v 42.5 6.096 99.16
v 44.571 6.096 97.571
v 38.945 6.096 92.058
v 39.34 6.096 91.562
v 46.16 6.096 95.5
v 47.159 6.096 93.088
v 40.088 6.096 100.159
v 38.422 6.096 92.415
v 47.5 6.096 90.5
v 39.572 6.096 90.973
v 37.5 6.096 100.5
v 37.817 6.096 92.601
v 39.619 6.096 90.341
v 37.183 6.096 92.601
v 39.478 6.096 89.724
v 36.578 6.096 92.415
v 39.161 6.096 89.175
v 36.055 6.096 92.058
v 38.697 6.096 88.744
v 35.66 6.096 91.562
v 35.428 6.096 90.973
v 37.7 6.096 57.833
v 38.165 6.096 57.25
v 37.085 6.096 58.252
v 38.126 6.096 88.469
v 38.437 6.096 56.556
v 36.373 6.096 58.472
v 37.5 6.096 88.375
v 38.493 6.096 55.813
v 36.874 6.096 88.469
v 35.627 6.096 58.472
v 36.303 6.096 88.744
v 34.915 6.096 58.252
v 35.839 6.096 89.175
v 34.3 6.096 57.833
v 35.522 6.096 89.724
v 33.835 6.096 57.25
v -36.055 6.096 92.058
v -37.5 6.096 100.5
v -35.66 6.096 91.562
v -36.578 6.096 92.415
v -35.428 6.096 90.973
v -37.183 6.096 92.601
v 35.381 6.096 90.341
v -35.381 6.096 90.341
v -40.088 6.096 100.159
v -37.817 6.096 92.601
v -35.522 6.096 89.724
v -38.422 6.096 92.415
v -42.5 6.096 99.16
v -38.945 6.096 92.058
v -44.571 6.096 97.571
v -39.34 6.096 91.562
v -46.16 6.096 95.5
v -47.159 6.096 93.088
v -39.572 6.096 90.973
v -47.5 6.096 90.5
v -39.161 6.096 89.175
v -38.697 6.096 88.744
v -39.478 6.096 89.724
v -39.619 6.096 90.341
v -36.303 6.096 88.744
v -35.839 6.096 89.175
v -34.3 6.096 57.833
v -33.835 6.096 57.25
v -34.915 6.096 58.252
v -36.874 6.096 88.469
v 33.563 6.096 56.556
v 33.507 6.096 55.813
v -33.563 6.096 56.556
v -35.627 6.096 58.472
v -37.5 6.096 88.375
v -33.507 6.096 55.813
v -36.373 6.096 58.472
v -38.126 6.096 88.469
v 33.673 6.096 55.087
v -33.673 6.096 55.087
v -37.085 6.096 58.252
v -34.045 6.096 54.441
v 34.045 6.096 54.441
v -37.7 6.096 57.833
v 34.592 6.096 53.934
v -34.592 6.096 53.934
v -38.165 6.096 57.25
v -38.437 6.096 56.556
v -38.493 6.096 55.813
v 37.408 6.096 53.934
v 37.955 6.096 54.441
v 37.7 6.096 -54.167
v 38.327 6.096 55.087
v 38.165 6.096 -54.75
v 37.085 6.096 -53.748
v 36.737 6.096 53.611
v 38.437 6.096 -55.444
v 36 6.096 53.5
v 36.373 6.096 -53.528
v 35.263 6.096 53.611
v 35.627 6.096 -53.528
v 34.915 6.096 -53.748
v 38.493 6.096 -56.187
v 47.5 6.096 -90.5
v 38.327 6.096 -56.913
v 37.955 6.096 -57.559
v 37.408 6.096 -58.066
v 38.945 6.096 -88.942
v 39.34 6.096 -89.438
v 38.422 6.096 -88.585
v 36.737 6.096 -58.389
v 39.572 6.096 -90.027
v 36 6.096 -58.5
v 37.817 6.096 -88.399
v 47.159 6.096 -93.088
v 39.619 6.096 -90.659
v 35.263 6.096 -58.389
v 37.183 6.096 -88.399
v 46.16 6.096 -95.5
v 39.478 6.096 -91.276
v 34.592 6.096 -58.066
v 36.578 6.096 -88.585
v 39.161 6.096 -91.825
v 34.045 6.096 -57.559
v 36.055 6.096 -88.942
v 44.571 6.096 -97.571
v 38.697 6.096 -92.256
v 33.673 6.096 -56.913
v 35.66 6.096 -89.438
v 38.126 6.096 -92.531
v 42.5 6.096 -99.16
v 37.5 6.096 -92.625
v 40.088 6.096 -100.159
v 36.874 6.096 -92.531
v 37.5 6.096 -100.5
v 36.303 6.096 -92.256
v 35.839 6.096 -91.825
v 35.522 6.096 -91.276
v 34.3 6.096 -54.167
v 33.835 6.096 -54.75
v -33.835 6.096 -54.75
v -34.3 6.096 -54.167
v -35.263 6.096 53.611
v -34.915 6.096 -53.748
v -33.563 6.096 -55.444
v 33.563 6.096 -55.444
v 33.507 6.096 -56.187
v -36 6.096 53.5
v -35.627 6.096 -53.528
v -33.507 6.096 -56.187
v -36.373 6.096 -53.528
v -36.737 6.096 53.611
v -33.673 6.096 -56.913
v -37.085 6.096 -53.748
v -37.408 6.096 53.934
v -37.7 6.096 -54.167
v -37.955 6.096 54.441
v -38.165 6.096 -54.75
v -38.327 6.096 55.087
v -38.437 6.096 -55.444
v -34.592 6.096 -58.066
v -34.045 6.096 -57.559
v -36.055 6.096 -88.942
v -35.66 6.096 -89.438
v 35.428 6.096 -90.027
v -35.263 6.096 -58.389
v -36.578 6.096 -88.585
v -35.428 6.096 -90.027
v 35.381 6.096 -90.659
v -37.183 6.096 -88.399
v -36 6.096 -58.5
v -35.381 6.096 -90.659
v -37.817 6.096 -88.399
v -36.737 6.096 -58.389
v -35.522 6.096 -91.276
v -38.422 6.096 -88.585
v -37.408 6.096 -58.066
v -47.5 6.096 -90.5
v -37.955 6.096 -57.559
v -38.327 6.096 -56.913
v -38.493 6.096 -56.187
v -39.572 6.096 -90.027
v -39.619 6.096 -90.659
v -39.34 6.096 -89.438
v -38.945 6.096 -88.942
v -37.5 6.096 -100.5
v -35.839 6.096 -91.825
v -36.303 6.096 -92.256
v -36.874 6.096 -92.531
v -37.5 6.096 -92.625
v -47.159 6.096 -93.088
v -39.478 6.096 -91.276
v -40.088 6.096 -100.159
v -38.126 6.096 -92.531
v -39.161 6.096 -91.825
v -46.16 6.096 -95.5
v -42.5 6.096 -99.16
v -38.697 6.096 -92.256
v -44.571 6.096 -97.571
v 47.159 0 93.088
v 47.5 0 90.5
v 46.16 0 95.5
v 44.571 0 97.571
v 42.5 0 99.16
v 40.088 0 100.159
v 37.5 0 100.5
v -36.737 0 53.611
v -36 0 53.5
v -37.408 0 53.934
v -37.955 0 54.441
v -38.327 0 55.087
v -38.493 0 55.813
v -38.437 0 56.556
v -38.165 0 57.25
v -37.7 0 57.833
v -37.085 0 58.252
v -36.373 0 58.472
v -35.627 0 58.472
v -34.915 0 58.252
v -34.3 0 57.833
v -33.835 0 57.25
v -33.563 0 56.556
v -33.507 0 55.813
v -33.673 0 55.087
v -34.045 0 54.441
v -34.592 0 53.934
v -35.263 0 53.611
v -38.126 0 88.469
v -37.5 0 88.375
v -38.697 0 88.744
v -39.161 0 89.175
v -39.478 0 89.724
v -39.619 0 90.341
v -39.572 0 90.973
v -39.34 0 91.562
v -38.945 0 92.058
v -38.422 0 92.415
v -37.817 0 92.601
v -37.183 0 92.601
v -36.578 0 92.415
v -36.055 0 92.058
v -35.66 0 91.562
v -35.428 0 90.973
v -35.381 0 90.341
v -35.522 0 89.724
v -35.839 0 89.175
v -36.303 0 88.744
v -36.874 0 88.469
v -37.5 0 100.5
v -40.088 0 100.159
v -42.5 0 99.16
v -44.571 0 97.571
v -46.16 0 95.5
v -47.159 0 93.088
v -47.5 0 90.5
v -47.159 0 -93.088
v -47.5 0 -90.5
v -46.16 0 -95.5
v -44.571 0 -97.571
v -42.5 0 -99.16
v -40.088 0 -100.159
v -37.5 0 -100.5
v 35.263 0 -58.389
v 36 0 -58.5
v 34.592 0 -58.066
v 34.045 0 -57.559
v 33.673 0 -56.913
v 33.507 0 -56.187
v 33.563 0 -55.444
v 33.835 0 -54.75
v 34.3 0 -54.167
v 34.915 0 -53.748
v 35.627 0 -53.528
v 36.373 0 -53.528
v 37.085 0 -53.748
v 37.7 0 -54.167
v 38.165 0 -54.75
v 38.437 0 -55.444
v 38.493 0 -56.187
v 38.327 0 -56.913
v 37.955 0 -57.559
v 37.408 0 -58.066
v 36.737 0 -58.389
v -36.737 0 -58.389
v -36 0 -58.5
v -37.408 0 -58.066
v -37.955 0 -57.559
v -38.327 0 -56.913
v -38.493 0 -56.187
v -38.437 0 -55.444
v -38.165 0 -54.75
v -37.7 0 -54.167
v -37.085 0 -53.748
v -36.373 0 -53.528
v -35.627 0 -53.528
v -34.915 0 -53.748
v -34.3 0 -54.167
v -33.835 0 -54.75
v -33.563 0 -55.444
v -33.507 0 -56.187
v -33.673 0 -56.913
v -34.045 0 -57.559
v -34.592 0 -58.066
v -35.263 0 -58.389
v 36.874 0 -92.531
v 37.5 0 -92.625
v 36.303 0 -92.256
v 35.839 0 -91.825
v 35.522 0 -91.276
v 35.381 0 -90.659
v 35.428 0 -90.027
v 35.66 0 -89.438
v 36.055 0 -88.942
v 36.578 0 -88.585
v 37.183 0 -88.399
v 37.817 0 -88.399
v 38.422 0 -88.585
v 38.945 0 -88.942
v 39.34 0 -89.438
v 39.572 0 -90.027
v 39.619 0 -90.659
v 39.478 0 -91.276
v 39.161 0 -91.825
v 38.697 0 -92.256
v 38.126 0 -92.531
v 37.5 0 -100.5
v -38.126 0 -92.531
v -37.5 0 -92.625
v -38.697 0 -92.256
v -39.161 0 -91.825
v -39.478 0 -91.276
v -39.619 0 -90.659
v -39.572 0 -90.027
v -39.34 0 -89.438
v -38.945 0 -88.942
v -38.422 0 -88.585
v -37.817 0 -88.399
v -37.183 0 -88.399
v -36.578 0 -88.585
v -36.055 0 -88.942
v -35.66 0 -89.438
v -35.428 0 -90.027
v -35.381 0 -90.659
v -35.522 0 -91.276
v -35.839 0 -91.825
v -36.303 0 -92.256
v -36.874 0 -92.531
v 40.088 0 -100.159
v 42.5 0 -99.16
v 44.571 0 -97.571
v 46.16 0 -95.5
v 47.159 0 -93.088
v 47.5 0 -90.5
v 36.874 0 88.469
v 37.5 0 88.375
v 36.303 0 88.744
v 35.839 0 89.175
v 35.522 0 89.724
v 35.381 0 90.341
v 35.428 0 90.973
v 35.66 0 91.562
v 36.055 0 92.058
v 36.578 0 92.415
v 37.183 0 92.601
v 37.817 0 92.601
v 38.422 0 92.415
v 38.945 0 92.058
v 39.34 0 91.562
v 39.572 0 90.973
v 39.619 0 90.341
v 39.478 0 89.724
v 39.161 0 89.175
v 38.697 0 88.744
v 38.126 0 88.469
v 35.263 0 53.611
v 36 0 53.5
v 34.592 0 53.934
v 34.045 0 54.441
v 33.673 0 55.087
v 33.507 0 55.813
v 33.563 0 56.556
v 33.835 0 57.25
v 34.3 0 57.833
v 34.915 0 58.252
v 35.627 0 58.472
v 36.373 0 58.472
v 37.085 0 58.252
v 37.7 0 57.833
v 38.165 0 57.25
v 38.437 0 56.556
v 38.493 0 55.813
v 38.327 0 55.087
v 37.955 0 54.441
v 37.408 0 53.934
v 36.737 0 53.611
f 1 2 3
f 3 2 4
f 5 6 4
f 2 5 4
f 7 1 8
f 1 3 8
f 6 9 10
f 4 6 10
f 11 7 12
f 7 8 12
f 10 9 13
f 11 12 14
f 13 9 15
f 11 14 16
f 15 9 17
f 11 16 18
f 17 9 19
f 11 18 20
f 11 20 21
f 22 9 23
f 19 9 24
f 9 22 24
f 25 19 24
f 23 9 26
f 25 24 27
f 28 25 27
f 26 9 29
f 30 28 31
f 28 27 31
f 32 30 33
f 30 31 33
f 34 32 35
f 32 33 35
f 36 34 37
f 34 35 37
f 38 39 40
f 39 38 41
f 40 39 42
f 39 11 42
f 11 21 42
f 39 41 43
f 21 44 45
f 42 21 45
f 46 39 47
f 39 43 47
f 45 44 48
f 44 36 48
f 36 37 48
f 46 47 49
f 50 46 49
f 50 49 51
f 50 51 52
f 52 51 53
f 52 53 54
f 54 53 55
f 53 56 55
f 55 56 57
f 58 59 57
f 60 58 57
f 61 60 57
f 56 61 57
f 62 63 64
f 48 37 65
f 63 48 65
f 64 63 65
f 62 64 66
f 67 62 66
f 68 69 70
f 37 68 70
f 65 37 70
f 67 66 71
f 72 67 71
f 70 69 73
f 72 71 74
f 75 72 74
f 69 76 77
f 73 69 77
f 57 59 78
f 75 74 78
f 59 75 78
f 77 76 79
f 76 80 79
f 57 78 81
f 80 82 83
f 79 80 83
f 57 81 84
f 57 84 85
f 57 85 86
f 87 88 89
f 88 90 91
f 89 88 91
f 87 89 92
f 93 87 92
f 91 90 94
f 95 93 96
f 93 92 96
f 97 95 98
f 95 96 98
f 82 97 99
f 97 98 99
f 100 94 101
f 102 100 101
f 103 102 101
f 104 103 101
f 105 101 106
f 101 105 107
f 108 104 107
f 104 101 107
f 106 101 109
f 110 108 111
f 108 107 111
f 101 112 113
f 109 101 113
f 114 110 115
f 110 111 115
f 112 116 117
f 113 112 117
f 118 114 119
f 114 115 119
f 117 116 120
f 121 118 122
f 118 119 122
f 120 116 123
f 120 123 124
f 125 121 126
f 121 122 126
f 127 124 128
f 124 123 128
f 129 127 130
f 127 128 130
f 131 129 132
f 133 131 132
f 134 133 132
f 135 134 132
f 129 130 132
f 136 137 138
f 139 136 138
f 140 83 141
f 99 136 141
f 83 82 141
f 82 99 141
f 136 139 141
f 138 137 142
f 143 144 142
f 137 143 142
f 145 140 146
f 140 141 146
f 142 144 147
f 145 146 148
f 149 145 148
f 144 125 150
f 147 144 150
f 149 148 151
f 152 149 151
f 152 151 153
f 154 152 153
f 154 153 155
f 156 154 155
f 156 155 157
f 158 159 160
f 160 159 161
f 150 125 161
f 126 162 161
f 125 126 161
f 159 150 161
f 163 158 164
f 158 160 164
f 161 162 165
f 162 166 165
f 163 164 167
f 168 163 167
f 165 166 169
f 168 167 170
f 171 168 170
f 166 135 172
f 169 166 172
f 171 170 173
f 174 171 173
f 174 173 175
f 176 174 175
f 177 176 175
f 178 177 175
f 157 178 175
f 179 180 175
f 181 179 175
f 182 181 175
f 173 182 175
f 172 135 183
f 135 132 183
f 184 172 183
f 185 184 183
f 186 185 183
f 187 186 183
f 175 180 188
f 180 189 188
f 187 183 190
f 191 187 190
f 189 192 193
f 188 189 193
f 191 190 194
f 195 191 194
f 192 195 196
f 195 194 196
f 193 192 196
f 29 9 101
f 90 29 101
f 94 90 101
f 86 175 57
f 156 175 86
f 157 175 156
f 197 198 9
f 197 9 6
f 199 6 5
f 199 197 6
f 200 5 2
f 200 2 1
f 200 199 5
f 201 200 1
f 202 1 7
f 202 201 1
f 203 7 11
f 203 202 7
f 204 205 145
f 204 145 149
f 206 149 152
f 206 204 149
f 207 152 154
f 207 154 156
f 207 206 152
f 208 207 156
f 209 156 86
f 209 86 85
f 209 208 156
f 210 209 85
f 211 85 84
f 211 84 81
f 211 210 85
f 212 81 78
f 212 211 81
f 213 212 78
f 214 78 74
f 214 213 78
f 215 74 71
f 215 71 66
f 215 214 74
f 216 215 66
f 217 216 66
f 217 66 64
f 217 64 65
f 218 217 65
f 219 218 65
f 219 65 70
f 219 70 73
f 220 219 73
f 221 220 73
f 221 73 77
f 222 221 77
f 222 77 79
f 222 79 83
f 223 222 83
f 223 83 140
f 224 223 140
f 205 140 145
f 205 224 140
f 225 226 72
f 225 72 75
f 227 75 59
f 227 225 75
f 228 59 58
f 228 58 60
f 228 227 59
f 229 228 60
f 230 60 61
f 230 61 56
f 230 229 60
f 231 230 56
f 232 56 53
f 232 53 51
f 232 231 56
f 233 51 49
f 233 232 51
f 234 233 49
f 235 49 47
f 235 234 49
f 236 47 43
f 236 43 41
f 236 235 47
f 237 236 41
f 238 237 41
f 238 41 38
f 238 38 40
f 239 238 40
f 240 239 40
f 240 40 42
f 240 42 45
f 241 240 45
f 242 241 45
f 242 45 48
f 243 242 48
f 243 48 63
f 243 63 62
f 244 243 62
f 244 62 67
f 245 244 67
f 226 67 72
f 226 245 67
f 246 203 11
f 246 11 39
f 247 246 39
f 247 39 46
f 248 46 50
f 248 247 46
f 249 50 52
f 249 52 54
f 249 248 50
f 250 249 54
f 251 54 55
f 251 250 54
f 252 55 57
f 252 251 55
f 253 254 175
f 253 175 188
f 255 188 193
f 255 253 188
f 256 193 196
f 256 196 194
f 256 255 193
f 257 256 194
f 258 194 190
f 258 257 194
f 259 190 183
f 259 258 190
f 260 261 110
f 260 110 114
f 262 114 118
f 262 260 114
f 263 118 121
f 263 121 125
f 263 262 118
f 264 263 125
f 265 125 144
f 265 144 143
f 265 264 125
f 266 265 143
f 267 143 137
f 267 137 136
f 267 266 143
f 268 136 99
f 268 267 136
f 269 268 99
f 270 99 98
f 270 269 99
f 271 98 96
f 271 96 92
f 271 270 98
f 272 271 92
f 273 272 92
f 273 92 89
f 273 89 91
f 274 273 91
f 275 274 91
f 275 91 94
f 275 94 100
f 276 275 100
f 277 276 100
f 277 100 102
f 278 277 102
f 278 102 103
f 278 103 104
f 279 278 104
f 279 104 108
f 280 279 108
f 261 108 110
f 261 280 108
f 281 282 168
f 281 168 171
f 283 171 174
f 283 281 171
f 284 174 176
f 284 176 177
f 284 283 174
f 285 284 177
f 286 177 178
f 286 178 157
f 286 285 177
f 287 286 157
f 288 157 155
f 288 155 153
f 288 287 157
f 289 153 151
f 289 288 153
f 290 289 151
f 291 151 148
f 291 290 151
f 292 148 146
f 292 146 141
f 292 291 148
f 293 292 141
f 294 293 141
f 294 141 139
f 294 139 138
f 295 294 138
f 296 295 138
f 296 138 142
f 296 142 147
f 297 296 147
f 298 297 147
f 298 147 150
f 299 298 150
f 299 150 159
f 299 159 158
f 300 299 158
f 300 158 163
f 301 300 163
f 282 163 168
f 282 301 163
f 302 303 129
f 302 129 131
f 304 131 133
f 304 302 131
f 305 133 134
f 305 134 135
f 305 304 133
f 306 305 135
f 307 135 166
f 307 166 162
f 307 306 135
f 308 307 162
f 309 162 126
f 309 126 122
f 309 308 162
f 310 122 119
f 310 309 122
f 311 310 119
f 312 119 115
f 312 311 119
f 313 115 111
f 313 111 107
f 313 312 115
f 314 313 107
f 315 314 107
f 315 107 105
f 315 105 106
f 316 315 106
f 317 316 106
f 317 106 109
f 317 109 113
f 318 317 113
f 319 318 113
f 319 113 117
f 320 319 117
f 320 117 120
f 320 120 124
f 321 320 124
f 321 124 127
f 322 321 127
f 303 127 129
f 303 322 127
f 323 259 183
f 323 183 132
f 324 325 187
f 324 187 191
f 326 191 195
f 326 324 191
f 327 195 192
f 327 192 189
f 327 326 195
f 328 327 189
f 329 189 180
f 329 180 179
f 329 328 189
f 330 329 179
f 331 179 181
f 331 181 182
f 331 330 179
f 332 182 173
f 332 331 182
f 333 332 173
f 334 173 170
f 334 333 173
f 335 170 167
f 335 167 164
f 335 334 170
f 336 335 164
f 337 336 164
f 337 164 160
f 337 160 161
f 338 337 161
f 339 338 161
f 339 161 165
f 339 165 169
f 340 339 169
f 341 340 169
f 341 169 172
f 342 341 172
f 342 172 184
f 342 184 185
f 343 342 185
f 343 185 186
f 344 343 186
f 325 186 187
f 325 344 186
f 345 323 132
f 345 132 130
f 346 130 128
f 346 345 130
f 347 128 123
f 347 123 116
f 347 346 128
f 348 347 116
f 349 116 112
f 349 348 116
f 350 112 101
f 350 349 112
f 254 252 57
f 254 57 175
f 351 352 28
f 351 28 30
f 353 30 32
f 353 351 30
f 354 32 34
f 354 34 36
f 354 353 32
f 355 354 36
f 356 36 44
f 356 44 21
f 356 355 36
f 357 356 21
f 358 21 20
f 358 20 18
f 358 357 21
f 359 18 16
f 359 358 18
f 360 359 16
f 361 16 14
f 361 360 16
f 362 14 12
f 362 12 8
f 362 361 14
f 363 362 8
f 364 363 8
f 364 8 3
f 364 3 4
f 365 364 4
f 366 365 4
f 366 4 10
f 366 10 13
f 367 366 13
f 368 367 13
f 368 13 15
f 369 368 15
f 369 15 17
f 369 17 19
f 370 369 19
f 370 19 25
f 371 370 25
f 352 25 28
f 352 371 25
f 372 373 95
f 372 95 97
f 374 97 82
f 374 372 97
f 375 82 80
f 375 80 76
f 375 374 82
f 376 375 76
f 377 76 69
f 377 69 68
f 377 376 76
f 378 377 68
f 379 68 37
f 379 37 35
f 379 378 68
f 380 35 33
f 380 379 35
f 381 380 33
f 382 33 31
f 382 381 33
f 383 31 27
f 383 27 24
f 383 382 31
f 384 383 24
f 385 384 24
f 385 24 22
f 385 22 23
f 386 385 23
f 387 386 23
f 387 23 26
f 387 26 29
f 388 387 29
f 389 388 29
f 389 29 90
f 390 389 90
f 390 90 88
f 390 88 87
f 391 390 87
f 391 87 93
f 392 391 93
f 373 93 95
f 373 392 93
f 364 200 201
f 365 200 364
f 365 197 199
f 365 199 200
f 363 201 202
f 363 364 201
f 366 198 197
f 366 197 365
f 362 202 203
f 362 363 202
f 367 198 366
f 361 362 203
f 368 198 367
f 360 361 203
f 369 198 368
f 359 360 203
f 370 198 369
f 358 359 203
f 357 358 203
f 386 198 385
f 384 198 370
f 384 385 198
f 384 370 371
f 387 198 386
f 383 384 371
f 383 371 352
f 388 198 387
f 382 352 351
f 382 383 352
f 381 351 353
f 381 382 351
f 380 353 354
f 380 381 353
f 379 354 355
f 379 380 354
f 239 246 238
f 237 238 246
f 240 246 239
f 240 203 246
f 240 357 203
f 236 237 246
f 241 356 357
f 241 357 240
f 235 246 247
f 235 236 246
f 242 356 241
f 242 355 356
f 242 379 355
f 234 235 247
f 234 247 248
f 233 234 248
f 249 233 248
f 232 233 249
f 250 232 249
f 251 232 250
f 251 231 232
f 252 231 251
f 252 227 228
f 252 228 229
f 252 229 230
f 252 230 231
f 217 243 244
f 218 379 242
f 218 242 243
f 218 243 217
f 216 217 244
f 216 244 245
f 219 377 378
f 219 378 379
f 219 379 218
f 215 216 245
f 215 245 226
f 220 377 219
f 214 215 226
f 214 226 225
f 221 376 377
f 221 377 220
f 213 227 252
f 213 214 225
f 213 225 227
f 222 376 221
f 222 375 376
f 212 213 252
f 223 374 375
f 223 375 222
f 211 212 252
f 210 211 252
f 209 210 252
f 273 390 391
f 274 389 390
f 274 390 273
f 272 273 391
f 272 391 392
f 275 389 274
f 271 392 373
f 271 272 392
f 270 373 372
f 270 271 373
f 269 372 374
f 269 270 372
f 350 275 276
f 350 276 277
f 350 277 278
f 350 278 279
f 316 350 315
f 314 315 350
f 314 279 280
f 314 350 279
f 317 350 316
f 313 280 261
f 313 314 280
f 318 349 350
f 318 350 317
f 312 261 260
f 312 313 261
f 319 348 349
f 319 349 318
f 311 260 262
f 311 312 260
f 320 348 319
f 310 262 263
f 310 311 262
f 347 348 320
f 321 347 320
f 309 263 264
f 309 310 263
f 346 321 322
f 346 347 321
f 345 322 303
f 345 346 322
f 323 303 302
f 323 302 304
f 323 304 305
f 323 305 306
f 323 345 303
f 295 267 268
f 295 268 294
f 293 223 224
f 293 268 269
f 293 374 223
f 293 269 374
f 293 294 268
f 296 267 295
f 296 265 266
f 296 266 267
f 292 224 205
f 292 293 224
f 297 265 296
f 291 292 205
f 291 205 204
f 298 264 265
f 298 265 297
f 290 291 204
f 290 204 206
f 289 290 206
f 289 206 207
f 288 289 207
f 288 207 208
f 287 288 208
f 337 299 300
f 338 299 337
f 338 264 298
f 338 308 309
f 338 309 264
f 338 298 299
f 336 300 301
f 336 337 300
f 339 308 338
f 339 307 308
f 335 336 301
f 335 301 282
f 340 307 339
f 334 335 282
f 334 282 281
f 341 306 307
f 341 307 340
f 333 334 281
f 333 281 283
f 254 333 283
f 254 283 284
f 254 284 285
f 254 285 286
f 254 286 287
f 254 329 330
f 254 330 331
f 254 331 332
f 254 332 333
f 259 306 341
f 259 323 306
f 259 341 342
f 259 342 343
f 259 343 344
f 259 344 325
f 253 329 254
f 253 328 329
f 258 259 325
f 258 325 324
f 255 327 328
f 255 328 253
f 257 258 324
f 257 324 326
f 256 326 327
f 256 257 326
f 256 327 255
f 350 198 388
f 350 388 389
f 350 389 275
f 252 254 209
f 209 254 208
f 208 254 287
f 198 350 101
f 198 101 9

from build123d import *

# Parameters (mm, degrees)
SKETCH1_R           = 2.5
SKETCH1_R_2         = 2.125
BOSS_EXTRUDE1_DEPTH = 6.096


with BuildPart() as part:
    # Sketch1 → Boss-Extrude1 (new body)
    with BuildSketch(Plane(origin=(0, 0, 0), x_dir=(1, 0, 0), z_dir=(0, 1, 0))):
        with BuildLine():
            Line((-37.5, 100.5), (37.5, 100.5))
            ThreePointArc((37.5, 100.5), (44.571067812, 97.571067812), (47.5, 90.5))
            Line((47.5, 90.5), (47.5, -90.5))
            ThreePointArc((47.5, -90.5), (44.571067812, -97.571067812), (37.5, -100.5))
            Line((37.5, -100.5), (-37.5, -100.5))
            ThreePointArc((-37.5, -100.5), (-44.571067812, -97.571067812), (-47.5, -90.5))
            Line((-47.5, -90.5), (-47.5, 90.5))
            ThreePointArc((-47.5, 90.5), (-44.571067812, 97.571067812), (-37.5, 100.5))
        make_face()
        with Locations(Location((-36, 56, 0), (0, 0, 90))):
            Circle(SKETCH1_R, mode=Mode.SUBTRACT)
        with Locations(Location((36, 56, 0), (0, 0, 90))):
            Circle(SKETCH1_R, mode=Mode.SUBTRACT)
        with Locations(Location((36, -56, 0), (0, 0, 90))):
            Circle(SKETCH1_R, mode=Mode.SUBTRACT)
        with Locations(Location((-36, -56, 0), (0, 0, 90))):
            Circle(SKETCH1_R, mode=Mode.SUBTRACT)
        with Locations(Location((-37.5, 90.5, 0), (0, 0, 90))):
            Circle(SKETCH1_R_2, mode=Mode.SUBTRACT)
        with Locations(Location((37.5, 90.5, 0), (0, 0, 90))):
            Circle(SKETCH1_R_2, mode=Mode.SUBTRACT)
        with Locations(Location((37.5, -90.5, 0), (0, 0, 90))):
            Circle(SKETCH1_R_2, mode=Mode.SUBTRACT)
        with Locations(Location((-37.5, -90.5, 0), (0, 0, 90))):
            Circle(SKETCH1_R_2, mode=Mode.SUBTRACT)
    extrude(amount=BOSS_EXTRUDE1_DEPTH)


solid = part.part
